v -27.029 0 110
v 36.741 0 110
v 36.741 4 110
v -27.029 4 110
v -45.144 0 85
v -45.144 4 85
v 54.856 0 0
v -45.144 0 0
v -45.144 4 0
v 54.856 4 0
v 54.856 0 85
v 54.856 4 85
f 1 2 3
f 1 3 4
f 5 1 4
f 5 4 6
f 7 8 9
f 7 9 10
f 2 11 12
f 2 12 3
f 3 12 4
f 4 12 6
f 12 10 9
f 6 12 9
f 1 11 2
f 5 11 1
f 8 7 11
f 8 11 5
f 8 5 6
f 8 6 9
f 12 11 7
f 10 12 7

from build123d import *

# Parameters (mm, degrees)
SKETCH1_W           = 100
SKETCH1_H           = 85
BOSS_EXTRUDE1_DEPTH = 4


with BuildPart() as part:
    # Sketch1 → Boss-Extrude1 (new body)
    with BuildSketch(Plane(origin=(0, 0, 0), x_dir=(1, 0, 0), z_dir=(0, 1, 0))):
        Polygon((-45.143769968, -85), (54.856230032, -85), (36.741214058, -110), (-27.028753994, -110), align=None)
        with Locations((4.856230032, -42.5)):
            Rectangle(SKETCH1_W, SKETCH1_H)
    extrude(amount=BOSS_EXTRUDE1_DEPTH)


solid = part.part
